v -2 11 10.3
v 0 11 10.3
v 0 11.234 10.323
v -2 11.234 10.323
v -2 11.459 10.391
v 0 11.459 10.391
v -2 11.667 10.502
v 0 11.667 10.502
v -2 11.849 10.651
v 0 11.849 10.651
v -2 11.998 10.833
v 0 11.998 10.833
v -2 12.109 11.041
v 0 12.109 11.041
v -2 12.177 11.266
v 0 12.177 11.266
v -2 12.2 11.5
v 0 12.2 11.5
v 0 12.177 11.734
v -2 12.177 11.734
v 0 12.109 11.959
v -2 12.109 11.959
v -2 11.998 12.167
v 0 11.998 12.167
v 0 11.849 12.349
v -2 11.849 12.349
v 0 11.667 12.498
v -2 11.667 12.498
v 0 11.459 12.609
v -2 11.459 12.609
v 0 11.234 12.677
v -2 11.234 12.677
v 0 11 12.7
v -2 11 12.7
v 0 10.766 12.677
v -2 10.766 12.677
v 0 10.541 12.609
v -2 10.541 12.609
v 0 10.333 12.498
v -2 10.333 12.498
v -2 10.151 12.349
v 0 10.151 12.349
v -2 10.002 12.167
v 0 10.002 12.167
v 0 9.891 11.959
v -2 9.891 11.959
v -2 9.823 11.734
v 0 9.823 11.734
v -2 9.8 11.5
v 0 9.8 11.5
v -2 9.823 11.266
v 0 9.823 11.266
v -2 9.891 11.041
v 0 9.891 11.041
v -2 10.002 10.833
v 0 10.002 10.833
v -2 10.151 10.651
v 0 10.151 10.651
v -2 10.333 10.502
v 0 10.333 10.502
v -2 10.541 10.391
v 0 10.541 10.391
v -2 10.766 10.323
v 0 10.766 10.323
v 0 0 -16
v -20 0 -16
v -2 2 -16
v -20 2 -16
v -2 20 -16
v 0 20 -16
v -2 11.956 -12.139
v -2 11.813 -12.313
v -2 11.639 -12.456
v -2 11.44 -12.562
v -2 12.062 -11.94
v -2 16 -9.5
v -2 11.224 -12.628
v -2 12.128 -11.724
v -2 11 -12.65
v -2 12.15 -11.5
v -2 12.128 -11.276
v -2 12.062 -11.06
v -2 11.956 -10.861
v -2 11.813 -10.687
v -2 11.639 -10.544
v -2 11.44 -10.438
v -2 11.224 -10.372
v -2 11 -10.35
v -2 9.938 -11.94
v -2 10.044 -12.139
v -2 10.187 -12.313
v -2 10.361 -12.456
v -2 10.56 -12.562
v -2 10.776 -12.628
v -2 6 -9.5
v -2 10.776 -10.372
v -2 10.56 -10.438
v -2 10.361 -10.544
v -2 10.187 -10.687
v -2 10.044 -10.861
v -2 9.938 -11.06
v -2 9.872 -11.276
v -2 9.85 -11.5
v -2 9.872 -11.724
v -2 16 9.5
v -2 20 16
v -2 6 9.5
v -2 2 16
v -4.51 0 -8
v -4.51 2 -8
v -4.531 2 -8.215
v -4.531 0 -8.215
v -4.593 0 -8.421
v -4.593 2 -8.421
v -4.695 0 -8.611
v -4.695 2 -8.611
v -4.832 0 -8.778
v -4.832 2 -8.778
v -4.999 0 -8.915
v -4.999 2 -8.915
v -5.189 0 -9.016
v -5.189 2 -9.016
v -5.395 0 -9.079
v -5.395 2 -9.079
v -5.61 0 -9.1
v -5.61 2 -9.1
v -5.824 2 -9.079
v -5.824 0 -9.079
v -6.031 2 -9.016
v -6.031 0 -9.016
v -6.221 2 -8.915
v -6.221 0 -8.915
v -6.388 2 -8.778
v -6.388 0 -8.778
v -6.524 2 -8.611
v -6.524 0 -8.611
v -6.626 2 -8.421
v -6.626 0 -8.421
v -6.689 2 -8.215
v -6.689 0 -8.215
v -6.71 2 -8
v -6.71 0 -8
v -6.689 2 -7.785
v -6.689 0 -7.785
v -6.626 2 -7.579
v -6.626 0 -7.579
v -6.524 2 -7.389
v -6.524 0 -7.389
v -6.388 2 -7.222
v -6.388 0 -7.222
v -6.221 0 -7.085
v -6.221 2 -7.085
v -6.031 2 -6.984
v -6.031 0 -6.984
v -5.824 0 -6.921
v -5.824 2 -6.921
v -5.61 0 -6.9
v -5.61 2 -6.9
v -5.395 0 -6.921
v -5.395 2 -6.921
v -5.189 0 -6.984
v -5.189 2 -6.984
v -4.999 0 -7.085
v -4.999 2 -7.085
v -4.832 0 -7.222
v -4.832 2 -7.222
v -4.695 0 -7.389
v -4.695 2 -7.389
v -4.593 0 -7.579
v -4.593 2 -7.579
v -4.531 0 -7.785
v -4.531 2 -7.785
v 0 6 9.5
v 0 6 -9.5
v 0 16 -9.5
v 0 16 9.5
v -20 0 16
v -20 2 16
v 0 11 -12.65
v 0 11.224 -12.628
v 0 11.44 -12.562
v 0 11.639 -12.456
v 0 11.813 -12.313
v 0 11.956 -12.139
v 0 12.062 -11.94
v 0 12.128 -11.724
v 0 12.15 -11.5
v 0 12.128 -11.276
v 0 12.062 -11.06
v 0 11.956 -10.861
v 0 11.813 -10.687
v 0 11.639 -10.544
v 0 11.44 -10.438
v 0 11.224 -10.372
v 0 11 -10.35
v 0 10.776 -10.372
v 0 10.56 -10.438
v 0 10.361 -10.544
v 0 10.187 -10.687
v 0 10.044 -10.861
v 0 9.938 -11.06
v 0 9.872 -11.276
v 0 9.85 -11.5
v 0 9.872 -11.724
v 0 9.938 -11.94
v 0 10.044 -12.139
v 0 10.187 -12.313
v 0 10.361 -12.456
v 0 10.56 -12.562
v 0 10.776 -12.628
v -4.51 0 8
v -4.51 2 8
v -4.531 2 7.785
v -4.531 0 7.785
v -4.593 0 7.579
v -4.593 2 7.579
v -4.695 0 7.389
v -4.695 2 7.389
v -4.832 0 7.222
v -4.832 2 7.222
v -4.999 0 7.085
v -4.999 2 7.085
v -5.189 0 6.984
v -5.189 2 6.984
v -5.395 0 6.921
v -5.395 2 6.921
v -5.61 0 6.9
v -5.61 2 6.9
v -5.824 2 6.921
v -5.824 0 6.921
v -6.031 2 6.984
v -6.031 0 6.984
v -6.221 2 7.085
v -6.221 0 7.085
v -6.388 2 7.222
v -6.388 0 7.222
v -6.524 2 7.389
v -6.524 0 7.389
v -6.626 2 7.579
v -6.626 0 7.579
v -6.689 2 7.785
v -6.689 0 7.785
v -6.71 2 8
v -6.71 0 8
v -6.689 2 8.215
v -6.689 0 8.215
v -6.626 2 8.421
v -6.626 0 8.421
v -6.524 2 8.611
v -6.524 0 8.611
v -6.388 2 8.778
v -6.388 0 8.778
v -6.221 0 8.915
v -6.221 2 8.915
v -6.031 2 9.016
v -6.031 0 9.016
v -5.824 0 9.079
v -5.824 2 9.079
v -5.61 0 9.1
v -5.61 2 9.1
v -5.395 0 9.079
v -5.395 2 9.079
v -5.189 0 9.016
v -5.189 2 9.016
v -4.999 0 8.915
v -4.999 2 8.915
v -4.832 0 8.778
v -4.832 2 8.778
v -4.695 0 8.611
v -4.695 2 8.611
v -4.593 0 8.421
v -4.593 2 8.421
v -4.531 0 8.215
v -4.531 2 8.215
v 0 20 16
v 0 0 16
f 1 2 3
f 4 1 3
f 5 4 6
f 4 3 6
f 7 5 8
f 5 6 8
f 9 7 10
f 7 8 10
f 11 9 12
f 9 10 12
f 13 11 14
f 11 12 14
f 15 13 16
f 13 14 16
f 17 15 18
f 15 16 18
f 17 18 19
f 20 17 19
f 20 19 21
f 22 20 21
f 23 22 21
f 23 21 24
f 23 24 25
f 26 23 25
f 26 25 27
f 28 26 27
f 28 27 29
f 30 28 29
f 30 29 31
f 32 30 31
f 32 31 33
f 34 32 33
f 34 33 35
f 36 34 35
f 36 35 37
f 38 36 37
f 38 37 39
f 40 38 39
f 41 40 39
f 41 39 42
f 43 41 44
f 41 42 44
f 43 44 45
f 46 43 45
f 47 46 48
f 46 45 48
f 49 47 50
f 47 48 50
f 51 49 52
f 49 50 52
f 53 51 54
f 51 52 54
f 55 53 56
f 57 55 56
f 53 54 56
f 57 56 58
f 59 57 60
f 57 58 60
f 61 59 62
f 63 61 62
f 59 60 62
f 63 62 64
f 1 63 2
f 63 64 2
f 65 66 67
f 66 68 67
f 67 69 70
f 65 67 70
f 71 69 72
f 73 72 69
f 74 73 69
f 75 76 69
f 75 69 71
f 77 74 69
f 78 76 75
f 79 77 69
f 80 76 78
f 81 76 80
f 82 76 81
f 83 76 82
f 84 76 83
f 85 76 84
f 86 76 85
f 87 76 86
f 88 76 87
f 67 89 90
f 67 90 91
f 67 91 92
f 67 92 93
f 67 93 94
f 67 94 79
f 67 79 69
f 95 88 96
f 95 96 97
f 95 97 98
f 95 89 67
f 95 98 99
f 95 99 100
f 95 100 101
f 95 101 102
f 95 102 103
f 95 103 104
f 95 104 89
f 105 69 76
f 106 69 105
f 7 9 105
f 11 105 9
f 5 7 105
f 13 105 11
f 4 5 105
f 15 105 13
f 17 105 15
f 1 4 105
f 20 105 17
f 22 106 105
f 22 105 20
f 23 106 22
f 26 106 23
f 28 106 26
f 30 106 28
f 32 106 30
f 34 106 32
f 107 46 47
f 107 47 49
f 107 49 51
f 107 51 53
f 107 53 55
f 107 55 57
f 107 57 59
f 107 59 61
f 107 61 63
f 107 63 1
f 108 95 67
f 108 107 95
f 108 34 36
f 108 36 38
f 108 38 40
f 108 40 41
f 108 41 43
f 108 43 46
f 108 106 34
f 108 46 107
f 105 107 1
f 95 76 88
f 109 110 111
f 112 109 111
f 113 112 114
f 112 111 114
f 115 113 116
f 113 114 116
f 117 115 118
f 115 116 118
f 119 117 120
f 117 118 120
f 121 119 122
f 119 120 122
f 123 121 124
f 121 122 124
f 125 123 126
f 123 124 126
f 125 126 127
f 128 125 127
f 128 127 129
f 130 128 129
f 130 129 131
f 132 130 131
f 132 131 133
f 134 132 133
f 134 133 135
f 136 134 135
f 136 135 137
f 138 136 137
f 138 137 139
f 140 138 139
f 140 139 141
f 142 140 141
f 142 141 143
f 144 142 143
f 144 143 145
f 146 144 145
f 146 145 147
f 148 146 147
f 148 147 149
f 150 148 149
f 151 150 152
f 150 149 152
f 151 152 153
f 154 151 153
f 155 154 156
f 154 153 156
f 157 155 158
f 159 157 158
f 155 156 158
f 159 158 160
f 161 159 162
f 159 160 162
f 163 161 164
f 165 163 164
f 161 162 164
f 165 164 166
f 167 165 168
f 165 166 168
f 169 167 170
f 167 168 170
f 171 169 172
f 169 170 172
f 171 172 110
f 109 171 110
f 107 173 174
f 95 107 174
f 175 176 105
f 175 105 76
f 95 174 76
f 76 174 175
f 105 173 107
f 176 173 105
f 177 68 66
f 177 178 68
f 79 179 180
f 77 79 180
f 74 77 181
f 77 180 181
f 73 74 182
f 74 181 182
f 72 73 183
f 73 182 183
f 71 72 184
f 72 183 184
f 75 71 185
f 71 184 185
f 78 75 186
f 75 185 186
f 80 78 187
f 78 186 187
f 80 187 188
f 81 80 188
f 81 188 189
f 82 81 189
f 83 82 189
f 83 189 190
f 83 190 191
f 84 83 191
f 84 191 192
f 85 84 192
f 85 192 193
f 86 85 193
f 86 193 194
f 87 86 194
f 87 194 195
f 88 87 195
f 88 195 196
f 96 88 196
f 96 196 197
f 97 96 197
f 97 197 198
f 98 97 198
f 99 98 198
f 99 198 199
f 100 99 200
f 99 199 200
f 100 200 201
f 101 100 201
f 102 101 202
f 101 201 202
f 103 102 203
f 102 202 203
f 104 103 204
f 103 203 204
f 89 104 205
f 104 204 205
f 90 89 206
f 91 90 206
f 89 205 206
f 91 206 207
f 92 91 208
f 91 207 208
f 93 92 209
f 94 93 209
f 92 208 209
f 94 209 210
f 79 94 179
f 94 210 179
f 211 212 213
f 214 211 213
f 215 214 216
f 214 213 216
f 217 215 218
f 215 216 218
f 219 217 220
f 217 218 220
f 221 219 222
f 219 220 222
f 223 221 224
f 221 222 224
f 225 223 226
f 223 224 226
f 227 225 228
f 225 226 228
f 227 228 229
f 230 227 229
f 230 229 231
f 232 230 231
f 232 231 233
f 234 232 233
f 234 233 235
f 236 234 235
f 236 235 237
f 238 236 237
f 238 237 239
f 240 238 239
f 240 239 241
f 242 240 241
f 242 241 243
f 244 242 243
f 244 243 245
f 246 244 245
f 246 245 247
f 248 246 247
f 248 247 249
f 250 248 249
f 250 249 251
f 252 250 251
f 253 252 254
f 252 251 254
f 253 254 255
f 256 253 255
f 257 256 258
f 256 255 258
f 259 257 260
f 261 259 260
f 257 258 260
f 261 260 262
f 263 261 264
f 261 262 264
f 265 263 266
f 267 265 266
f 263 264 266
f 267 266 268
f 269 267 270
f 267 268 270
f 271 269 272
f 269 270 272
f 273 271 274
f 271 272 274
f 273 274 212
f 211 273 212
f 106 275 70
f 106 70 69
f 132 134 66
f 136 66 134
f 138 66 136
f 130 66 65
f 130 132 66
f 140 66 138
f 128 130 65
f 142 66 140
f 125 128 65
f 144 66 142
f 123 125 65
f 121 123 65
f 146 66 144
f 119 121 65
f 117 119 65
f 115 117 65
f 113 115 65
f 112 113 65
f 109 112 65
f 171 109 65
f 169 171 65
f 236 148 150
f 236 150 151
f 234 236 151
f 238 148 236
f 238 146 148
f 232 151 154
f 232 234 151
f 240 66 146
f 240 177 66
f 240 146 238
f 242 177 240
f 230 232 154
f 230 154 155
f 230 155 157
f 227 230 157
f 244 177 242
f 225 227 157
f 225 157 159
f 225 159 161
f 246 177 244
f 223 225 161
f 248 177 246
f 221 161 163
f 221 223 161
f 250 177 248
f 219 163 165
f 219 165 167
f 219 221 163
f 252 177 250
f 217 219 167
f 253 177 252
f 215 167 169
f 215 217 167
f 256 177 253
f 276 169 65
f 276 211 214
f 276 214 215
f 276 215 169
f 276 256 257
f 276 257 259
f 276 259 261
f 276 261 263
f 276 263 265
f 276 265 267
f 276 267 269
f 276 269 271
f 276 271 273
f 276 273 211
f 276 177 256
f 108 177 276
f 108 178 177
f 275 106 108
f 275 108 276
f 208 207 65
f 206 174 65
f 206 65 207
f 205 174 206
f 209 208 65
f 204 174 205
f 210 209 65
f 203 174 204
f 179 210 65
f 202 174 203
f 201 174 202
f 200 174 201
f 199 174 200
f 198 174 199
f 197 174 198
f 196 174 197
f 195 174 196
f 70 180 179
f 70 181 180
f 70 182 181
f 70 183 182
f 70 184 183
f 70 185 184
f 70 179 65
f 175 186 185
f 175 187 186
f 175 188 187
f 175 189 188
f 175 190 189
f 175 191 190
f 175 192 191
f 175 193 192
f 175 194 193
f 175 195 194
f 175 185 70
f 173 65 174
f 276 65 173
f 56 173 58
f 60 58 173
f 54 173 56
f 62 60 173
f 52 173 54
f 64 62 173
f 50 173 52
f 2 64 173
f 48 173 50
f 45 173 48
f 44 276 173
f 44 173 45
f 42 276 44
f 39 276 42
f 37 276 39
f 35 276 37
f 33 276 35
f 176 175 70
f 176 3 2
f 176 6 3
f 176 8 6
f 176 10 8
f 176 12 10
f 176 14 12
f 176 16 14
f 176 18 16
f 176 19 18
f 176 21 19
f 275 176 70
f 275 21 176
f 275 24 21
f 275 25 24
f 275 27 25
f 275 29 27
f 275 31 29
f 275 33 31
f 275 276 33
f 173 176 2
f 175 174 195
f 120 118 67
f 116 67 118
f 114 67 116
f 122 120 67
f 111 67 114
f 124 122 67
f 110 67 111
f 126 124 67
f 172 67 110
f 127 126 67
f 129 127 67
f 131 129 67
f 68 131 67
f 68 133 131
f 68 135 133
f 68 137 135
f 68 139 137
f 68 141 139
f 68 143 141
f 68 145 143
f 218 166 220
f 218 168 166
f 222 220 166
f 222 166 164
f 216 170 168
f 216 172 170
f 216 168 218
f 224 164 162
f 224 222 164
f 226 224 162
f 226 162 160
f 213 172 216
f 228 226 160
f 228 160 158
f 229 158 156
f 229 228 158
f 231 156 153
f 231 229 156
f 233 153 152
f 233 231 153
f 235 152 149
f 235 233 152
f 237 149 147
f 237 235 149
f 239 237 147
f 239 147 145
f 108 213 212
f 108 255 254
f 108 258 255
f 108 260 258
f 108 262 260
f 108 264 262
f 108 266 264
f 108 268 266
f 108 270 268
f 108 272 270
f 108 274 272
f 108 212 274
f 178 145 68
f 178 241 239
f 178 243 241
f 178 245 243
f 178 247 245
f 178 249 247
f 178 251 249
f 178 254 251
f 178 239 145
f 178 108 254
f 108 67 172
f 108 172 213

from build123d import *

# Parameters (mm, degrees)
EXTRUDE_1_DEPTH     = 16
SKETCH_4_R          = 1.15
SKETCH_4_R_2        = 1.2
SKETCH_4_W          = 19
SKETCH_4_H          = 10
CUT_EXTRUDE_1_DEPTH = 30
SKETCH_5_R          = 1.1
CUT_EXTRUDE_2_DEPTH = 30


with BuildPart() as part:
    # 草图2 → 凸台-拉伸1 (new body, symmetric)
    with BuildSketch(Plane.XY):
        Polygon((-20, 0), (0, 0), (0, 20), (-2, 20), (-2, 2), (-20, 2), align=None)
    extrude(amount=EXTRUDE_1_DEPTH, both=True)

    # 草图4 → 切除-拉伸1 (cut)
    with BuildSketch(Plane(origin=(0, 0, 0), x_dir=(0, 0, -1), z_dir=(1, 0, 0))):
        with Locations((11.5, 11)):
            Circle(SKETCH_4_R)
        with Locations((-11.5, 11)):
            Circle(SKETCH_4_R_2)
        with Locations((0, 11)):
            Rectangle(SKETCH_4_W, SKETCH_4_H)
    extrude(amount=-CUT_EXTRUDE_1_DEPTH, mode=Mode.SUBTRACT)

    # 草图5 → 切除-拉伸2 (cut)
    with BuildSketch(Plane(origin=(0, 2, 0), x_dir=(1, 0, 0), z_dir=(0, 1, 0))):
        with Locations((-5.609756098, 8)):
            Circle(SKETCH_5_R)
        with Locations((-5.609756098, -8)):
            Circle(SKETCH_5_R)
    extrude(amount=-CUT_EXTRUDE_2_DEPTH, mode=Mode.SUBTRACT)


solid = part.part
